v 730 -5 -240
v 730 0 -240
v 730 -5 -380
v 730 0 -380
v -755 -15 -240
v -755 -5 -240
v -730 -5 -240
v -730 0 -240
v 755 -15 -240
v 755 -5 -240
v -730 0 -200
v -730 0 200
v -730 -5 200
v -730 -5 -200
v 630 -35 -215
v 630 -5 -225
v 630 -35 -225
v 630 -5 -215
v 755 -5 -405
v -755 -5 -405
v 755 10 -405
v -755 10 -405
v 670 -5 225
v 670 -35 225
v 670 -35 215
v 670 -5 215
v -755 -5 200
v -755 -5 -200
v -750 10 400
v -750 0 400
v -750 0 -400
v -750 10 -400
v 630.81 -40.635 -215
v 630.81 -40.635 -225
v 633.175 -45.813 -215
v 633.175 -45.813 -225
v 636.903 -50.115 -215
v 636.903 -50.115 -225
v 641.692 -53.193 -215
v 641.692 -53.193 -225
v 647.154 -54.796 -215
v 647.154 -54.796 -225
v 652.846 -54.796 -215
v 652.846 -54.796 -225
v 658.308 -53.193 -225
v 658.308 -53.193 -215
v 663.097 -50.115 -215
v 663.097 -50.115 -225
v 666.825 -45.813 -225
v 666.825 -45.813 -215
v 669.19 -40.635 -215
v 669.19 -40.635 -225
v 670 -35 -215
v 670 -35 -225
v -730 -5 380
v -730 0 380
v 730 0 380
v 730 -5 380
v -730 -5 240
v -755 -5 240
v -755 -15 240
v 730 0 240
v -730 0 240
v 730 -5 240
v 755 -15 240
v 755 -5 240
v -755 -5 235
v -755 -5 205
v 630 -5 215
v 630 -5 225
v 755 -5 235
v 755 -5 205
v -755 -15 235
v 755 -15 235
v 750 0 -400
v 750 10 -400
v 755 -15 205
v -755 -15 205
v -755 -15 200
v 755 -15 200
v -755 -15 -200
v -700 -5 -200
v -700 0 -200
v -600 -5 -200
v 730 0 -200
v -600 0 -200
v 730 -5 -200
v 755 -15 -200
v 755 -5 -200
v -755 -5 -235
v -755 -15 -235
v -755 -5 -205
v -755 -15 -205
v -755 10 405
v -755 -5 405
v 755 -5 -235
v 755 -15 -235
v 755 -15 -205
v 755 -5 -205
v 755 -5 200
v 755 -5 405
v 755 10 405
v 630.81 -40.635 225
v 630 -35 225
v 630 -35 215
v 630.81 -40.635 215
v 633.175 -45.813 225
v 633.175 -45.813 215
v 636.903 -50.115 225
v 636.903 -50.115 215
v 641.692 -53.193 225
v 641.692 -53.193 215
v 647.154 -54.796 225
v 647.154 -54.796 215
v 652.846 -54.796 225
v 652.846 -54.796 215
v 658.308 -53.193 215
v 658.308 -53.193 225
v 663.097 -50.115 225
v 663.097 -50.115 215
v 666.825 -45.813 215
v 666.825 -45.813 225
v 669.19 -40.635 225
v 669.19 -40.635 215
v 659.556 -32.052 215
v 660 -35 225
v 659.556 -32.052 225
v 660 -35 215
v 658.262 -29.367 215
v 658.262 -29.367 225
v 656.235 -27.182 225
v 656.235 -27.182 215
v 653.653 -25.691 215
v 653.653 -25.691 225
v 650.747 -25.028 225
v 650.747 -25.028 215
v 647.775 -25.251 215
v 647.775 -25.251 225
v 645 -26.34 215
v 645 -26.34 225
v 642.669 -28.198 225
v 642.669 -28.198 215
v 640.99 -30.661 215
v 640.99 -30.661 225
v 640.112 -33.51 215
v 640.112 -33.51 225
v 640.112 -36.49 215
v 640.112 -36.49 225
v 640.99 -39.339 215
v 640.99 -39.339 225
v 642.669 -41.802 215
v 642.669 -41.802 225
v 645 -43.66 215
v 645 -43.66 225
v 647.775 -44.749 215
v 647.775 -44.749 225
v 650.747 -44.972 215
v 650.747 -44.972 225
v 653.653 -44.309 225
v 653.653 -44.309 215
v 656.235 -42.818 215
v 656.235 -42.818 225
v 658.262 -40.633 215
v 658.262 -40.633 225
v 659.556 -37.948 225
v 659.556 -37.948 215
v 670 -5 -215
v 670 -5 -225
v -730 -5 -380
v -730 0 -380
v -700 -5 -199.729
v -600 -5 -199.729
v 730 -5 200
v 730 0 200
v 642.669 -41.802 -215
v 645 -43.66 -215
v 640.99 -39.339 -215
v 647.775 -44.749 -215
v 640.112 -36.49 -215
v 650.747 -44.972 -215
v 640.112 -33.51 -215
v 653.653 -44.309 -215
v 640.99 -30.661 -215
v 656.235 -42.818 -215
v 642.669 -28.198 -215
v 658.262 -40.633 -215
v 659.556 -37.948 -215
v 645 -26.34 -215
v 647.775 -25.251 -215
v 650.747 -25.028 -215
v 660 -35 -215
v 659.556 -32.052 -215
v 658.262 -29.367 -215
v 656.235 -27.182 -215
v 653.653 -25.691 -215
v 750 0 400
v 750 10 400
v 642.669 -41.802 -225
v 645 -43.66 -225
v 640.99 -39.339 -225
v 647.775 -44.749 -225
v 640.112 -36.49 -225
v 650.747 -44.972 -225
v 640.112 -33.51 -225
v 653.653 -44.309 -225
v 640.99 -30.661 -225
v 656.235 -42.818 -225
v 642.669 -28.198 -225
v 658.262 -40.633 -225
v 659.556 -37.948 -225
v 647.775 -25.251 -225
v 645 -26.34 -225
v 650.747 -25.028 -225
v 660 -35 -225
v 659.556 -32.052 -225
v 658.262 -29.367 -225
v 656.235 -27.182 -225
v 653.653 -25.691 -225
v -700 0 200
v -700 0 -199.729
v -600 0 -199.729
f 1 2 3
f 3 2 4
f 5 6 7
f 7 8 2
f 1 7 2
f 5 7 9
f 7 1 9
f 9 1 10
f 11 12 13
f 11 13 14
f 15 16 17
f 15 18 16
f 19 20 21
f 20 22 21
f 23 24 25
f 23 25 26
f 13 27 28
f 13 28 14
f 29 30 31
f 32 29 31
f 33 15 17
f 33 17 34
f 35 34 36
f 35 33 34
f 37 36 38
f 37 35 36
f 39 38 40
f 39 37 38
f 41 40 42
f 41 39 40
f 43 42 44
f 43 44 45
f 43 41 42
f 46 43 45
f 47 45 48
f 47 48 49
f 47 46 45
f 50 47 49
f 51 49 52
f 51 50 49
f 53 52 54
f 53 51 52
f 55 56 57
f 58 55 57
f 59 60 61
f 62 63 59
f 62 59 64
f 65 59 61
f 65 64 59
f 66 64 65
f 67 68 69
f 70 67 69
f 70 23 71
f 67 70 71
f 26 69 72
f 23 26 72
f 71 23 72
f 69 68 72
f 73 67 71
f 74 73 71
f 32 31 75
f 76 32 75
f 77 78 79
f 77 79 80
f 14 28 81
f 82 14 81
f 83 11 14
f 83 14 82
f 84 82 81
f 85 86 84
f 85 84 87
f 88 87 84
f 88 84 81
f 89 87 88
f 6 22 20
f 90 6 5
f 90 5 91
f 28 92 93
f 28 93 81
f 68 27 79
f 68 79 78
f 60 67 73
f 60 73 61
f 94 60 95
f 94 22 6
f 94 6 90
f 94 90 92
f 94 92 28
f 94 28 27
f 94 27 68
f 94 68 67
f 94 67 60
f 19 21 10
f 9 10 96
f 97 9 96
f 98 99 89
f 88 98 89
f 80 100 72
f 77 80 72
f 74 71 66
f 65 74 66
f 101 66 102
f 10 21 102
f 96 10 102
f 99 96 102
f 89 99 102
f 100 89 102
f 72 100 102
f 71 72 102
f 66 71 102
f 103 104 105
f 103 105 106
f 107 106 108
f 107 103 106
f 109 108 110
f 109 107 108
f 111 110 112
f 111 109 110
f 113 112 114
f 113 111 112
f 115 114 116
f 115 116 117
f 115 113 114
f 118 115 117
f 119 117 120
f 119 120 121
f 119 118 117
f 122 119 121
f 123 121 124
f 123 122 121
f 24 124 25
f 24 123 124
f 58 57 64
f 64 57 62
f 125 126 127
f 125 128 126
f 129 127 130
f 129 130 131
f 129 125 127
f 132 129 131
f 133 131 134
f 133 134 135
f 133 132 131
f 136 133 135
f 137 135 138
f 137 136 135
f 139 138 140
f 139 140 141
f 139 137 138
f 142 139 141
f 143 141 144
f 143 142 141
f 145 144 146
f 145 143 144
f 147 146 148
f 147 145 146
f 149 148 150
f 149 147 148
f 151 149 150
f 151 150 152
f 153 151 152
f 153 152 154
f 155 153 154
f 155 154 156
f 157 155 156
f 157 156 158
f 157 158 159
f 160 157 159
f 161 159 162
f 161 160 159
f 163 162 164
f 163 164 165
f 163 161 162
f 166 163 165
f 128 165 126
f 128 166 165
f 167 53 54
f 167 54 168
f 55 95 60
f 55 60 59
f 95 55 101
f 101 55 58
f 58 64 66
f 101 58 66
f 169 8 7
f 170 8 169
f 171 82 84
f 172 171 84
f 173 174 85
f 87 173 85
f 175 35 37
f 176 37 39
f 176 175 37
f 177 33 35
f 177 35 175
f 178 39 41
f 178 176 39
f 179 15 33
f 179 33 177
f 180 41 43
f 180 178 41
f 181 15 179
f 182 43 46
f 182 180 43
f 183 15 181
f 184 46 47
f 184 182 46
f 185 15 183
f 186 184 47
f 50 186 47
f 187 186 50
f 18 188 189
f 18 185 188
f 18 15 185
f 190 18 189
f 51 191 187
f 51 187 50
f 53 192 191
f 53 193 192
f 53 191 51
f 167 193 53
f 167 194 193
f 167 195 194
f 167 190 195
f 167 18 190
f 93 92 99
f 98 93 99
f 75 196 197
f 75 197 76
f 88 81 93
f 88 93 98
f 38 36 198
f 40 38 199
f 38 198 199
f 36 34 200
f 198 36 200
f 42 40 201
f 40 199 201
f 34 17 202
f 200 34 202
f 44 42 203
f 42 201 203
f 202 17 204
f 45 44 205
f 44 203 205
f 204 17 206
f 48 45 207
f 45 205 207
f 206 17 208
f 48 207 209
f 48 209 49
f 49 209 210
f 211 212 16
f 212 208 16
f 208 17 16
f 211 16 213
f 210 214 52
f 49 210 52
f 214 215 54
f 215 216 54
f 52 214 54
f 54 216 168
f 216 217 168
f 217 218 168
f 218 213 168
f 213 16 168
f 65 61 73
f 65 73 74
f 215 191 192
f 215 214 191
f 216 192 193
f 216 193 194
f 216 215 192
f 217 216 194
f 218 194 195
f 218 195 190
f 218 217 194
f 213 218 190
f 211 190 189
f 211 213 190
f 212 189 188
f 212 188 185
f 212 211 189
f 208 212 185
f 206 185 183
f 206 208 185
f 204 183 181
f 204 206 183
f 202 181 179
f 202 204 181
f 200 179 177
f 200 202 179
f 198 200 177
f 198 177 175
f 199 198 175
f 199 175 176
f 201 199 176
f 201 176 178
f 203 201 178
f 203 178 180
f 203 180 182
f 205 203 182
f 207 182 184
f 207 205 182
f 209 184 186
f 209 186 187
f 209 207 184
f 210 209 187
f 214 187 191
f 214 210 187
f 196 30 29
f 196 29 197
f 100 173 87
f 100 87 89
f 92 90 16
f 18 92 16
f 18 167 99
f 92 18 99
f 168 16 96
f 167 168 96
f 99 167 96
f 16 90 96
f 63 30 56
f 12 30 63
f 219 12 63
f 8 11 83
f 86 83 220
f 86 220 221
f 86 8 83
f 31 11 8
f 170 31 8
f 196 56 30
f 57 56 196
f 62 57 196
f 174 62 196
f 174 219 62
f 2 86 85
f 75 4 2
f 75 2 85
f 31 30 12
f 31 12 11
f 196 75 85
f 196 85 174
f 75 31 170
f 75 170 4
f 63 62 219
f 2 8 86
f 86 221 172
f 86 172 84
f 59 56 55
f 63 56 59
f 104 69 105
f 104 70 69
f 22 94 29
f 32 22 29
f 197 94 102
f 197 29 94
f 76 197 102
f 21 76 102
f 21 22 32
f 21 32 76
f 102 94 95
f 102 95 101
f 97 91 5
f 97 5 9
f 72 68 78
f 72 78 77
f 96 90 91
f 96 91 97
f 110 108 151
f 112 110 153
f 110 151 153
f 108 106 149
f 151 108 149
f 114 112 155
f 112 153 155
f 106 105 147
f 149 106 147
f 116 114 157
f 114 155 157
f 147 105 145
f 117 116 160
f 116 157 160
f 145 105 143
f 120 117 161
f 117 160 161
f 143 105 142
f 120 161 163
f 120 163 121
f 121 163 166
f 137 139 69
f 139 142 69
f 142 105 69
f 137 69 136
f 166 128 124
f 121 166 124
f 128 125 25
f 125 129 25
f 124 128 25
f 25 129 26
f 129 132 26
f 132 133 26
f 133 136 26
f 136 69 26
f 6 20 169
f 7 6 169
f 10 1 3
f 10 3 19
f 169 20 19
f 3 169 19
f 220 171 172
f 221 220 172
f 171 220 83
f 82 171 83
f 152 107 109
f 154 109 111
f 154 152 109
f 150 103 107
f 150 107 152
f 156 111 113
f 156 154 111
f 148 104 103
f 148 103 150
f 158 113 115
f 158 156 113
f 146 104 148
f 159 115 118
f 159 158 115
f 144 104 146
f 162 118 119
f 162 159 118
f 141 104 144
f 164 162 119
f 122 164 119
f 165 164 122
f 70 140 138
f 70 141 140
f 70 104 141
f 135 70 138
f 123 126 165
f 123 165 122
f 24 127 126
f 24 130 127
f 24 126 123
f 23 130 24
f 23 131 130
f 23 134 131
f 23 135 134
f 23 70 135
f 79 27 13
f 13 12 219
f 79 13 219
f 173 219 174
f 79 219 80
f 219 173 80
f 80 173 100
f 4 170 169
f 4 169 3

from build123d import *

# Parameters (mm, degrees)
SKETCH2_W                 = 1510
SKETCH2_H                 = 810
SKETCH2_W_2               = 1500
SKETCH2_H_2               = 800
BOSS_EXTRUDE1_DEPTH       = 10
SKETCH3_W                 = 1510
SKETCH3_H                 = 810
SKETCH3_W_2               = 1460
SKETCH3_H_2               = 140
SKETCH3_W_3               = 30
SKETCH3_H_3               = 400
SKETCH3_W_4               = 1200
BOSS_EXTRUDE2_DEPTH       = 5
SKETCH5_W                 = 1510
SKETCH5_H                 = 5
BOSS_EXTRUDE3_DEPTH       = 10
LPATTERN1_COUNT           = 2
LPATTERN1_PITCH           = 35
LPATTERN2_COUNT           = 2
LPATTERN2_PITCH           = 440
LPATTERN2_COPY_1_SKETCH_W = 1510
LPATTERN2_COPY_1_SKETCH_H = 5
LPATTERN2_COPY_1_DEPTH    = 10
SKETCH6_R                 = 10
BOSS_EXTRUDE4_DEPTH       = 5
LPATTERN3_COUNT           = 2
LPATTERN3_PITCH           = 440
SKETCH7_W                 = 100
SKETCH7_H                 = 399.729040111
SKETCH7_H_2               = 400
CUT_EXTRUDE5_DEPTH        = 10


with BuildPart() as part:
    # Sketch2 → Boss-Extrude1 (new body)
    with BuildSketch(Plane(origin=(0, 0, 0), x_dir=(1, 0, 0), z_dir=(0, 1, 0))):
        Rectangle(SKETCH2_W, SKETCH2_H)
        Rectangle(SKETCH2_W_2, SKETCH2_H_2, mode=Mode.SUBTRACT)
    extrude(amount=BOSS_EXTRUDE1_DEPTH)

    # Sketch3 → Boss-Extrude2 (add)
    with BuildSketch(Plane(origin=(0, 0, 0), x_dir=(1, 0, 0), z_dir=(0, 1, 0))):
        Rectangle(SKETCH3_W, SKETCH3_H)
        with Locations((0, -310)):
            Rectangle(SKETCH3_W_2, SKETCH3_H_2, mode=Mode.SUBTRACT)
        with Locations((0, 310)):
            Rectangle(SKETCH3_W_2, SKETCH3_H_2, mode=Mode.SUBTRACT)
        with Locations((-715, 0)):
            Rectangle(SKETCH3_W_3, SKETCH3_H_3, mode=Mode.SUBTRACT)
        with Locations((715, 0)):
            Rectangle(SKETCH3_W_3, SKETCH3_H_3, mode=Mode.SUBTRACT)
        Rectangle(SKETCH3_W_4, SKETCH3_H_3, mode=Mode.SUBTRACT)
    extrude(amount=-BOSS_EXTRUDE2_DEPTH)

    # Sketch5 → Boss-Extrude3 (add)
    with BuildSketch(Plane.XZ.offset(5)):
        with Locations((0, 237.5)):
            Rectangle(SKETCH5_W, SKETCH5_H)
    boss_extrude3 = extrude(amount=BOSS_EXTRUDE3_DEPTH)

    # LPattern1: Boss-Extrude3 ×2
    with Locations(*[(0, 0, -i * LPATTERN1_PITCH) for i in range(1, LPATTERN1_COUNT)]):
        add(boss_extrude3)

    # LPattern2: Boss-Extrude3 ×2
    with Locations(*[(0, 0, -i * LPATTERN2_PITCH) for i in range(1, LPATTERN2_COUNT)]):
        add(boss_extrude3)

    # LPattern2 copy 1 sketch → LPattern2 copy 1 (add)
    with BuildSketch(Plane(origin=(0, -5, -475), x_dir=(1, 0, 0), z_dir=(0, -1, 0))):
        with Locations((0, 237.5)):
            Rectangle(LPATTERN2_COPY_1_SKETCH_W, LPATTERN2_COPY_1_SKETCH_H)
    extrude(amount=LPATTERN2_COPY_1_DEPTH)

    # Sketch6 → Boss-Extrude4 (add, symmetric)
    with BuildSketch(Plane.XY.offset(220)):
        with BuildLine():
            Line((630, -5), (630, -35))
            ThreePointArc((630, -35), (650, -55), (670, -35))
            Line((670, -35), (670, -5))
            Line((670, -5), (630, -5))
        make_face()
        with Locations((650, -35)):
            Circle(SKETCH6_R, mode=Mode.SUBTRACT)
    boss_extrude4 = extrude(amount=BOSS_EXTRUDE4_DEPTH, both=True)

    # LPattern3: Boss-Extrude4 ×2
    with Locations(*[(0, 0, -i * LPATTERN3_PITCH) for i in range(1, LPATTERN3_COUNT)]):
        add(boss_extrude4)

    # Sketch7 → Cut-Extrude5 (cut)
    with BuildSketch(Plane.XZ.offset(5)):
        with Locations((-650, 0.135479944)):
            Rectangle(SKETCH7_W, SKETCH7_H)
        with Locations((650, 0)):
            Rectangle(SKETCH7_W, SKETCH7_H_2)
    extrude(amount=-CUT_EXTRUDE5_DEPTH, mode=Mode.SUBTRACT)


solid = part.part
